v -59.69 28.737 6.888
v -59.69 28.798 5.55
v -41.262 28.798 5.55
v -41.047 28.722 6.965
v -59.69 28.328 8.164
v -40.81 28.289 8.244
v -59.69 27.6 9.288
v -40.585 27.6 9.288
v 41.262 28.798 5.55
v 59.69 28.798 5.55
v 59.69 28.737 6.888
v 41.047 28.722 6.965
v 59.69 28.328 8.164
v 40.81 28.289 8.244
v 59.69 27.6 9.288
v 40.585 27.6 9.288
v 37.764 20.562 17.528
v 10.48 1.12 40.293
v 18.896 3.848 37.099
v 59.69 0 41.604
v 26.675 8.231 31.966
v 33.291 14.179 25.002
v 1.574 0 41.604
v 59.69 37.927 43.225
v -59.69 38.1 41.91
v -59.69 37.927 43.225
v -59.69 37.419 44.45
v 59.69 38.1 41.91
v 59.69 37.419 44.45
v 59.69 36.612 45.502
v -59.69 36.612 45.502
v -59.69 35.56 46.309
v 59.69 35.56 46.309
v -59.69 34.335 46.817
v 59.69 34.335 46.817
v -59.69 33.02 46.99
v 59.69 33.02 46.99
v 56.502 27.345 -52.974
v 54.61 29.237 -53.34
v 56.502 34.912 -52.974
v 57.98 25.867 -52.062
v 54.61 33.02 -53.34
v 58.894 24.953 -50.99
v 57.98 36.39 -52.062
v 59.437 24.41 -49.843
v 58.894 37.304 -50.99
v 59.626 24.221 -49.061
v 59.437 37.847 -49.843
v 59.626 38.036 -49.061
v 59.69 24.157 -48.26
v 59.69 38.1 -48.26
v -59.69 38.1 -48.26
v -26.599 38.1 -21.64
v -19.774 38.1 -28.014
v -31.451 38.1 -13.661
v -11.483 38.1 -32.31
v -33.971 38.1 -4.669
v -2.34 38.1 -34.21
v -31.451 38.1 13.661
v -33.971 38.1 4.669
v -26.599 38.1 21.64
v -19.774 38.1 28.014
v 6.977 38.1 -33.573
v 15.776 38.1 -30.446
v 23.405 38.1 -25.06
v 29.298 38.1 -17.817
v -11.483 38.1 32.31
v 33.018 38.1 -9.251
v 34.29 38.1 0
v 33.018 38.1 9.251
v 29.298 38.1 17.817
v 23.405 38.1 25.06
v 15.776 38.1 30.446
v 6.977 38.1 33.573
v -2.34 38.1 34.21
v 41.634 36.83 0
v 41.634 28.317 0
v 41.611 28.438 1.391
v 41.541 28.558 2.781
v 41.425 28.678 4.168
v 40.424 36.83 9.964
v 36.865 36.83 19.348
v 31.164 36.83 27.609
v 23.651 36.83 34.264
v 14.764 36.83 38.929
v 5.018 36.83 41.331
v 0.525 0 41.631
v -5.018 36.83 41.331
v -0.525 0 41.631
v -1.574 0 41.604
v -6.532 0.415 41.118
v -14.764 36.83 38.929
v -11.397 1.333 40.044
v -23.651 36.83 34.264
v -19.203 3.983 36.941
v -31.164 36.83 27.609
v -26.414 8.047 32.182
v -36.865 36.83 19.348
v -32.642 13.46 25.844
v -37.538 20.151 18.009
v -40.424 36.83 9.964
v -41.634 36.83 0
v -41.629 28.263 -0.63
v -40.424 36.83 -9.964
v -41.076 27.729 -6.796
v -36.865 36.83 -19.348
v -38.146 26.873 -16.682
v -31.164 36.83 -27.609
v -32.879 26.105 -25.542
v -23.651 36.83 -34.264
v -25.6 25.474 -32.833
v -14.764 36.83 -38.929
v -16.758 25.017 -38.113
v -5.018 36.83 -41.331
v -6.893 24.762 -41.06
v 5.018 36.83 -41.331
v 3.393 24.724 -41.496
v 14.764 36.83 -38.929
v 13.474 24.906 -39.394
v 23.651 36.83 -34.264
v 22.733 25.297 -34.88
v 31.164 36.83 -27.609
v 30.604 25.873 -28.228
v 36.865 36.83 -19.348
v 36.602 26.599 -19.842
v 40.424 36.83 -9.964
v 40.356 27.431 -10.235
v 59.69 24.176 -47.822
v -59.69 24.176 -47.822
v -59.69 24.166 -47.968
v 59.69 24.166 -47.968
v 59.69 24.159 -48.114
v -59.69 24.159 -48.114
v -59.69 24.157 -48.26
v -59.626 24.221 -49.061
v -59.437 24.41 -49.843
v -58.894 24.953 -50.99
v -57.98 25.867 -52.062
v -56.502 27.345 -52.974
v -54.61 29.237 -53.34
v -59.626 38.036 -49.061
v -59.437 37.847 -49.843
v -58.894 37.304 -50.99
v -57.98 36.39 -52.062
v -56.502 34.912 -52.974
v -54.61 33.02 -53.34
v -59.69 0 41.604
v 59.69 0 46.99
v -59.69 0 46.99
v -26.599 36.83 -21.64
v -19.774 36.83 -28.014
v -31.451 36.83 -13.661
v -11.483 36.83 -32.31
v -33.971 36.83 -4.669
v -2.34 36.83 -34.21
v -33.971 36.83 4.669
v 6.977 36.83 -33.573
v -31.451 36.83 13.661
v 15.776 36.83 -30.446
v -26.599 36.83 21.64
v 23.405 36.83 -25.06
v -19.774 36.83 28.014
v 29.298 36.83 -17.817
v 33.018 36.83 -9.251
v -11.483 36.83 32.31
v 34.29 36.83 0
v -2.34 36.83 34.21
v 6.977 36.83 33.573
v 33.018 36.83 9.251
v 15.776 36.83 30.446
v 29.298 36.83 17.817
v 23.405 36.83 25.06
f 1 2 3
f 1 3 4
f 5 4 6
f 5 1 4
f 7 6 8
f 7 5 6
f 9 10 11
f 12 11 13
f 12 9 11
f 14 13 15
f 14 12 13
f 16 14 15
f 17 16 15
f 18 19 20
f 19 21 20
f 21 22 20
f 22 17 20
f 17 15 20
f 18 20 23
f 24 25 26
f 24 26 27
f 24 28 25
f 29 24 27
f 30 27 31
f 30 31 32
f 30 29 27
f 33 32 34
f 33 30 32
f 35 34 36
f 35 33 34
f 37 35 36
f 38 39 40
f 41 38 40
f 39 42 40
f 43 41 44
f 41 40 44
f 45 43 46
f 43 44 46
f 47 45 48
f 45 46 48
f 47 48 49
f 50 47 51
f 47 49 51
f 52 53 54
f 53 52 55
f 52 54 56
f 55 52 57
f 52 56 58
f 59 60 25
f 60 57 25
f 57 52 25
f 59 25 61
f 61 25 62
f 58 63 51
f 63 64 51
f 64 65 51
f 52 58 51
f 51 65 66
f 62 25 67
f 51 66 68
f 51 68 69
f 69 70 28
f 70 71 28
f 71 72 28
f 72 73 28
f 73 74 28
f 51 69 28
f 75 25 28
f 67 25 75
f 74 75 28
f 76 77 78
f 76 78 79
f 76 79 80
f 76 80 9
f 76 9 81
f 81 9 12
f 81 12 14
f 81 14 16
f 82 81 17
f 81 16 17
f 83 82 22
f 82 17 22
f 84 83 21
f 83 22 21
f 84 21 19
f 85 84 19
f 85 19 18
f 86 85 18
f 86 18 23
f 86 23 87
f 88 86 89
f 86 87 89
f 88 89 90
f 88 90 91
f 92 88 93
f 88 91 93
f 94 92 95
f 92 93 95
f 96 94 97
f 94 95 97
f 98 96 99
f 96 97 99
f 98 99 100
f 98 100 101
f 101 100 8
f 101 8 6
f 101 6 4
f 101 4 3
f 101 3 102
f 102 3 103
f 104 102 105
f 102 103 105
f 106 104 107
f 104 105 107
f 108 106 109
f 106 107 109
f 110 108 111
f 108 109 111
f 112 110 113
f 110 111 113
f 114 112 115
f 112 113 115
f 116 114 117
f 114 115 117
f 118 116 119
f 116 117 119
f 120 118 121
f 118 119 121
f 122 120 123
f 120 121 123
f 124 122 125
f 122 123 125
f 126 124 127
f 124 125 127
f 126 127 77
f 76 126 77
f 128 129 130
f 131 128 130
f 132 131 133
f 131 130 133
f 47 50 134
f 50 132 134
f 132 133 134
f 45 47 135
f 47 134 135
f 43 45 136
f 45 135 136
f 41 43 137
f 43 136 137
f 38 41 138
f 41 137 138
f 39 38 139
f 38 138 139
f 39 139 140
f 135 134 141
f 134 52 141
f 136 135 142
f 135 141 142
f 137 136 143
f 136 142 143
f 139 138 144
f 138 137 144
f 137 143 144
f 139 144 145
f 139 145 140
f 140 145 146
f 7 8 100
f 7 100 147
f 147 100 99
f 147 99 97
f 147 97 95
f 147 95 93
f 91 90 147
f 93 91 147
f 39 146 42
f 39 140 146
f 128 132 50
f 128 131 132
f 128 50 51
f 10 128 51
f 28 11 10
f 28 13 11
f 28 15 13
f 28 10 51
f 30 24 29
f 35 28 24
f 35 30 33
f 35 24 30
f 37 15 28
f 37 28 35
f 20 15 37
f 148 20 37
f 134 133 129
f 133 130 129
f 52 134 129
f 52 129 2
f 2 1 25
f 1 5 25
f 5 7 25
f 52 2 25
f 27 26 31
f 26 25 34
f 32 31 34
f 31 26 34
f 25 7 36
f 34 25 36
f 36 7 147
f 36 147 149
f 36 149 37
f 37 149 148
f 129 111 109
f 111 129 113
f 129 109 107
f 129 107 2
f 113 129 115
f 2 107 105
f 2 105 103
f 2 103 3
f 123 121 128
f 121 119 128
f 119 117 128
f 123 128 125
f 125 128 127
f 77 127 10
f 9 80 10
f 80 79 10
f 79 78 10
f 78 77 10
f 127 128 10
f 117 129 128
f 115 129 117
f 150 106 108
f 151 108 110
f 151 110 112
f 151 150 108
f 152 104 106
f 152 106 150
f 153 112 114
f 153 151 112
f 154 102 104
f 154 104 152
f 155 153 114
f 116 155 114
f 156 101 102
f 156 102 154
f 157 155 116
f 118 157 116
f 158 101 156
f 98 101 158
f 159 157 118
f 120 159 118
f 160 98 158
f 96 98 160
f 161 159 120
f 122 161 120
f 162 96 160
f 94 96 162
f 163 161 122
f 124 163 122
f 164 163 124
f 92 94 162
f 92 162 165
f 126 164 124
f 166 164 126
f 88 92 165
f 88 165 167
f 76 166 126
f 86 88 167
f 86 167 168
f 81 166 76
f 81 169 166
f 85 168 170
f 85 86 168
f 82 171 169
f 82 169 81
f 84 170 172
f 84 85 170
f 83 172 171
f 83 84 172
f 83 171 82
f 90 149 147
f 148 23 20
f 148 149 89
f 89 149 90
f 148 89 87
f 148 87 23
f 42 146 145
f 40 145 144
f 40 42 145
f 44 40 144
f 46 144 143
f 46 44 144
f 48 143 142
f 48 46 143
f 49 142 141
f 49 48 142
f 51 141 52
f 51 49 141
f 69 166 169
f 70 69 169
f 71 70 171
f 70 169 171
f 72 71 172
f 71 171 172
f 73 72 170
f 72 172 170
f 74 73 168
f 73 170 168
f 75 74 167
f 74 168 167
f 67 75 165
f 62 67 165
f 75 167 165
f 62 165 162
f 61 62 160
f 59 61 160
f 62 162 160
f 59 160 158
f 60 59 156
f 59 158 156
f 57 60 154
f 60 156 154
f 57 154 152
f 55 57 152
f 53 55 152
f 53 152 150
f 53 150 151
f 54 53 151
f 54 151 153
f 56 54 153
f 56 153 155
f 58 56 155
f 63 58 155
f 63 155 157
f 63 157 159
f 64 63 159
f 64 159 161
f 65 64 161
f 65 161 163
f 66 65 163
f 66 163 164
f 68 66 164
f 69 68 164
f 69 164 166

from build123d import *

# Parameters (mm, degrees)
F0_W     = 119.38
F0_H     = 100.33
F0_R     = 34.29
F1_DEPTH = 38.1
F4_DEPTH = 119.381
F5_R     = 5.08
F6_R     = 5.08
F7_R     = 5.08
F8_R     = 41.6341019148
F9_DEPTH = 36.83


with BuildPart() as f1:
    # F0 (on Front) → F1 (new body)
    with BuildSketch(Plane.XZ):
        with Locations((0, -3.175)):
            Rectangle(F0_W, F0_H)
        Circle(F0_R, mode=Mode.SUBTRACT)
    extrude(amount=-F1_DEPTH)

    # F3 (on face) → F4 (cut, through all)
    with BuildSketch(Plane.YZ.offset(59.69)):
        Polygon((28.9814, 7.6699430424), (0, 41.6043430424), (0, -53.34), (23.6982, -53.34), align=None)
    extrude(amount=-F4_DEPTH, mode=Mode.SUBTRACT)

    # F5
    f5_edges = [f1.edges().sort_by_distance(p)[0] for p in [
        (46.555596, 28.9814, 7.669943),
        (-46.555596, 28.9814, 7.669943),
    ]]
    fillet(f5_edges, radius=F5_R)

    # F6
    f6_edges = [f1.edges().sort_by_distance(p)[0] for p in [
        (0, 38.1, -53.34),
        (0, 23.6982, -53.34),
        (59.69, 30.8991, -53.34),
        (-59.69, 30.8991, -53.34),
    ]]
    fillet(f6_edges, radius=F6_R)

    # F7
    f7_edges = [f1.edges().sort_by_distance(p)[0] for p in [
        (0, 38.1, 46.99),
    ]]
    fillet(f7_edges, radius=F7_R)

    # F8 (on Front) → F9 (cut)
    with BuildSketch(Plane.XZ):
        Circle(F8_R)
    extrude(amount=-F9_DEPTH, mode=Mode.SUBTRACT)


solid = f1.part
